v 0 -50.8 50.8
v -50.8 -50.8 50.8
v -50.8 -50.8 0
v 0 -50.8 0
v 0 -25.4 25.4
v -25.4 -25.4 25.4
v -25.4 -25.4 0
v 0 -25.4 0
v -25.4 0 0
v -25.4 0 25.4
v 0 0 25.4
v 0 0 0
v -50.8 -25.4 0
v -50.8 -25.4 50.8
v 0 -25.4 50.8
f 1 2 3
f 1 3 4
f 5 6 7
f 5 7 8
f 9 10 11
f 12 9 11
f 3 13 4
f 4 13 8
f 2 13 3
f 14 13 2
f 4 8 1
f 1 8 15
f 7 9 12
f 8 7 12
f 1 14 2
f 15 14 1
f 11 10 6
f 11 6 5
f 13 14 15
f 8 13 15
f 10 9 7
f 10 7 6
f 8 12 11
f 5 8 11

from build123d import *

# Parameters (mm, degrees)
F0_W     = 25.4
F0_H     = 25.4
F1_DEPTH = 25.4
F2_W     = 50.8
F2_H     = 50.8
F3_DEPTH = 25.4


with BuildPart() as f1:
    # F0 (on Front) → F1 (new body)
    with BuildSketch(Plane.XZ):
        with Locations((-12.7, 12.7)):
            Rectangle(F0_W, F0_H)
    extrude(amount=F1_DEPTH)


with BuildPart() as f3:
    # F2 (on face) → F3 (new body)
    with BuildSketch(Plane.XZ.offset(25.4)):
        with Locations((-25.4, 25.4)):
            Rectangle(F2_W, F2_H)
    extrude(amount=F3_DEPTH)


solid = Compound([f1.part, f3.part])
